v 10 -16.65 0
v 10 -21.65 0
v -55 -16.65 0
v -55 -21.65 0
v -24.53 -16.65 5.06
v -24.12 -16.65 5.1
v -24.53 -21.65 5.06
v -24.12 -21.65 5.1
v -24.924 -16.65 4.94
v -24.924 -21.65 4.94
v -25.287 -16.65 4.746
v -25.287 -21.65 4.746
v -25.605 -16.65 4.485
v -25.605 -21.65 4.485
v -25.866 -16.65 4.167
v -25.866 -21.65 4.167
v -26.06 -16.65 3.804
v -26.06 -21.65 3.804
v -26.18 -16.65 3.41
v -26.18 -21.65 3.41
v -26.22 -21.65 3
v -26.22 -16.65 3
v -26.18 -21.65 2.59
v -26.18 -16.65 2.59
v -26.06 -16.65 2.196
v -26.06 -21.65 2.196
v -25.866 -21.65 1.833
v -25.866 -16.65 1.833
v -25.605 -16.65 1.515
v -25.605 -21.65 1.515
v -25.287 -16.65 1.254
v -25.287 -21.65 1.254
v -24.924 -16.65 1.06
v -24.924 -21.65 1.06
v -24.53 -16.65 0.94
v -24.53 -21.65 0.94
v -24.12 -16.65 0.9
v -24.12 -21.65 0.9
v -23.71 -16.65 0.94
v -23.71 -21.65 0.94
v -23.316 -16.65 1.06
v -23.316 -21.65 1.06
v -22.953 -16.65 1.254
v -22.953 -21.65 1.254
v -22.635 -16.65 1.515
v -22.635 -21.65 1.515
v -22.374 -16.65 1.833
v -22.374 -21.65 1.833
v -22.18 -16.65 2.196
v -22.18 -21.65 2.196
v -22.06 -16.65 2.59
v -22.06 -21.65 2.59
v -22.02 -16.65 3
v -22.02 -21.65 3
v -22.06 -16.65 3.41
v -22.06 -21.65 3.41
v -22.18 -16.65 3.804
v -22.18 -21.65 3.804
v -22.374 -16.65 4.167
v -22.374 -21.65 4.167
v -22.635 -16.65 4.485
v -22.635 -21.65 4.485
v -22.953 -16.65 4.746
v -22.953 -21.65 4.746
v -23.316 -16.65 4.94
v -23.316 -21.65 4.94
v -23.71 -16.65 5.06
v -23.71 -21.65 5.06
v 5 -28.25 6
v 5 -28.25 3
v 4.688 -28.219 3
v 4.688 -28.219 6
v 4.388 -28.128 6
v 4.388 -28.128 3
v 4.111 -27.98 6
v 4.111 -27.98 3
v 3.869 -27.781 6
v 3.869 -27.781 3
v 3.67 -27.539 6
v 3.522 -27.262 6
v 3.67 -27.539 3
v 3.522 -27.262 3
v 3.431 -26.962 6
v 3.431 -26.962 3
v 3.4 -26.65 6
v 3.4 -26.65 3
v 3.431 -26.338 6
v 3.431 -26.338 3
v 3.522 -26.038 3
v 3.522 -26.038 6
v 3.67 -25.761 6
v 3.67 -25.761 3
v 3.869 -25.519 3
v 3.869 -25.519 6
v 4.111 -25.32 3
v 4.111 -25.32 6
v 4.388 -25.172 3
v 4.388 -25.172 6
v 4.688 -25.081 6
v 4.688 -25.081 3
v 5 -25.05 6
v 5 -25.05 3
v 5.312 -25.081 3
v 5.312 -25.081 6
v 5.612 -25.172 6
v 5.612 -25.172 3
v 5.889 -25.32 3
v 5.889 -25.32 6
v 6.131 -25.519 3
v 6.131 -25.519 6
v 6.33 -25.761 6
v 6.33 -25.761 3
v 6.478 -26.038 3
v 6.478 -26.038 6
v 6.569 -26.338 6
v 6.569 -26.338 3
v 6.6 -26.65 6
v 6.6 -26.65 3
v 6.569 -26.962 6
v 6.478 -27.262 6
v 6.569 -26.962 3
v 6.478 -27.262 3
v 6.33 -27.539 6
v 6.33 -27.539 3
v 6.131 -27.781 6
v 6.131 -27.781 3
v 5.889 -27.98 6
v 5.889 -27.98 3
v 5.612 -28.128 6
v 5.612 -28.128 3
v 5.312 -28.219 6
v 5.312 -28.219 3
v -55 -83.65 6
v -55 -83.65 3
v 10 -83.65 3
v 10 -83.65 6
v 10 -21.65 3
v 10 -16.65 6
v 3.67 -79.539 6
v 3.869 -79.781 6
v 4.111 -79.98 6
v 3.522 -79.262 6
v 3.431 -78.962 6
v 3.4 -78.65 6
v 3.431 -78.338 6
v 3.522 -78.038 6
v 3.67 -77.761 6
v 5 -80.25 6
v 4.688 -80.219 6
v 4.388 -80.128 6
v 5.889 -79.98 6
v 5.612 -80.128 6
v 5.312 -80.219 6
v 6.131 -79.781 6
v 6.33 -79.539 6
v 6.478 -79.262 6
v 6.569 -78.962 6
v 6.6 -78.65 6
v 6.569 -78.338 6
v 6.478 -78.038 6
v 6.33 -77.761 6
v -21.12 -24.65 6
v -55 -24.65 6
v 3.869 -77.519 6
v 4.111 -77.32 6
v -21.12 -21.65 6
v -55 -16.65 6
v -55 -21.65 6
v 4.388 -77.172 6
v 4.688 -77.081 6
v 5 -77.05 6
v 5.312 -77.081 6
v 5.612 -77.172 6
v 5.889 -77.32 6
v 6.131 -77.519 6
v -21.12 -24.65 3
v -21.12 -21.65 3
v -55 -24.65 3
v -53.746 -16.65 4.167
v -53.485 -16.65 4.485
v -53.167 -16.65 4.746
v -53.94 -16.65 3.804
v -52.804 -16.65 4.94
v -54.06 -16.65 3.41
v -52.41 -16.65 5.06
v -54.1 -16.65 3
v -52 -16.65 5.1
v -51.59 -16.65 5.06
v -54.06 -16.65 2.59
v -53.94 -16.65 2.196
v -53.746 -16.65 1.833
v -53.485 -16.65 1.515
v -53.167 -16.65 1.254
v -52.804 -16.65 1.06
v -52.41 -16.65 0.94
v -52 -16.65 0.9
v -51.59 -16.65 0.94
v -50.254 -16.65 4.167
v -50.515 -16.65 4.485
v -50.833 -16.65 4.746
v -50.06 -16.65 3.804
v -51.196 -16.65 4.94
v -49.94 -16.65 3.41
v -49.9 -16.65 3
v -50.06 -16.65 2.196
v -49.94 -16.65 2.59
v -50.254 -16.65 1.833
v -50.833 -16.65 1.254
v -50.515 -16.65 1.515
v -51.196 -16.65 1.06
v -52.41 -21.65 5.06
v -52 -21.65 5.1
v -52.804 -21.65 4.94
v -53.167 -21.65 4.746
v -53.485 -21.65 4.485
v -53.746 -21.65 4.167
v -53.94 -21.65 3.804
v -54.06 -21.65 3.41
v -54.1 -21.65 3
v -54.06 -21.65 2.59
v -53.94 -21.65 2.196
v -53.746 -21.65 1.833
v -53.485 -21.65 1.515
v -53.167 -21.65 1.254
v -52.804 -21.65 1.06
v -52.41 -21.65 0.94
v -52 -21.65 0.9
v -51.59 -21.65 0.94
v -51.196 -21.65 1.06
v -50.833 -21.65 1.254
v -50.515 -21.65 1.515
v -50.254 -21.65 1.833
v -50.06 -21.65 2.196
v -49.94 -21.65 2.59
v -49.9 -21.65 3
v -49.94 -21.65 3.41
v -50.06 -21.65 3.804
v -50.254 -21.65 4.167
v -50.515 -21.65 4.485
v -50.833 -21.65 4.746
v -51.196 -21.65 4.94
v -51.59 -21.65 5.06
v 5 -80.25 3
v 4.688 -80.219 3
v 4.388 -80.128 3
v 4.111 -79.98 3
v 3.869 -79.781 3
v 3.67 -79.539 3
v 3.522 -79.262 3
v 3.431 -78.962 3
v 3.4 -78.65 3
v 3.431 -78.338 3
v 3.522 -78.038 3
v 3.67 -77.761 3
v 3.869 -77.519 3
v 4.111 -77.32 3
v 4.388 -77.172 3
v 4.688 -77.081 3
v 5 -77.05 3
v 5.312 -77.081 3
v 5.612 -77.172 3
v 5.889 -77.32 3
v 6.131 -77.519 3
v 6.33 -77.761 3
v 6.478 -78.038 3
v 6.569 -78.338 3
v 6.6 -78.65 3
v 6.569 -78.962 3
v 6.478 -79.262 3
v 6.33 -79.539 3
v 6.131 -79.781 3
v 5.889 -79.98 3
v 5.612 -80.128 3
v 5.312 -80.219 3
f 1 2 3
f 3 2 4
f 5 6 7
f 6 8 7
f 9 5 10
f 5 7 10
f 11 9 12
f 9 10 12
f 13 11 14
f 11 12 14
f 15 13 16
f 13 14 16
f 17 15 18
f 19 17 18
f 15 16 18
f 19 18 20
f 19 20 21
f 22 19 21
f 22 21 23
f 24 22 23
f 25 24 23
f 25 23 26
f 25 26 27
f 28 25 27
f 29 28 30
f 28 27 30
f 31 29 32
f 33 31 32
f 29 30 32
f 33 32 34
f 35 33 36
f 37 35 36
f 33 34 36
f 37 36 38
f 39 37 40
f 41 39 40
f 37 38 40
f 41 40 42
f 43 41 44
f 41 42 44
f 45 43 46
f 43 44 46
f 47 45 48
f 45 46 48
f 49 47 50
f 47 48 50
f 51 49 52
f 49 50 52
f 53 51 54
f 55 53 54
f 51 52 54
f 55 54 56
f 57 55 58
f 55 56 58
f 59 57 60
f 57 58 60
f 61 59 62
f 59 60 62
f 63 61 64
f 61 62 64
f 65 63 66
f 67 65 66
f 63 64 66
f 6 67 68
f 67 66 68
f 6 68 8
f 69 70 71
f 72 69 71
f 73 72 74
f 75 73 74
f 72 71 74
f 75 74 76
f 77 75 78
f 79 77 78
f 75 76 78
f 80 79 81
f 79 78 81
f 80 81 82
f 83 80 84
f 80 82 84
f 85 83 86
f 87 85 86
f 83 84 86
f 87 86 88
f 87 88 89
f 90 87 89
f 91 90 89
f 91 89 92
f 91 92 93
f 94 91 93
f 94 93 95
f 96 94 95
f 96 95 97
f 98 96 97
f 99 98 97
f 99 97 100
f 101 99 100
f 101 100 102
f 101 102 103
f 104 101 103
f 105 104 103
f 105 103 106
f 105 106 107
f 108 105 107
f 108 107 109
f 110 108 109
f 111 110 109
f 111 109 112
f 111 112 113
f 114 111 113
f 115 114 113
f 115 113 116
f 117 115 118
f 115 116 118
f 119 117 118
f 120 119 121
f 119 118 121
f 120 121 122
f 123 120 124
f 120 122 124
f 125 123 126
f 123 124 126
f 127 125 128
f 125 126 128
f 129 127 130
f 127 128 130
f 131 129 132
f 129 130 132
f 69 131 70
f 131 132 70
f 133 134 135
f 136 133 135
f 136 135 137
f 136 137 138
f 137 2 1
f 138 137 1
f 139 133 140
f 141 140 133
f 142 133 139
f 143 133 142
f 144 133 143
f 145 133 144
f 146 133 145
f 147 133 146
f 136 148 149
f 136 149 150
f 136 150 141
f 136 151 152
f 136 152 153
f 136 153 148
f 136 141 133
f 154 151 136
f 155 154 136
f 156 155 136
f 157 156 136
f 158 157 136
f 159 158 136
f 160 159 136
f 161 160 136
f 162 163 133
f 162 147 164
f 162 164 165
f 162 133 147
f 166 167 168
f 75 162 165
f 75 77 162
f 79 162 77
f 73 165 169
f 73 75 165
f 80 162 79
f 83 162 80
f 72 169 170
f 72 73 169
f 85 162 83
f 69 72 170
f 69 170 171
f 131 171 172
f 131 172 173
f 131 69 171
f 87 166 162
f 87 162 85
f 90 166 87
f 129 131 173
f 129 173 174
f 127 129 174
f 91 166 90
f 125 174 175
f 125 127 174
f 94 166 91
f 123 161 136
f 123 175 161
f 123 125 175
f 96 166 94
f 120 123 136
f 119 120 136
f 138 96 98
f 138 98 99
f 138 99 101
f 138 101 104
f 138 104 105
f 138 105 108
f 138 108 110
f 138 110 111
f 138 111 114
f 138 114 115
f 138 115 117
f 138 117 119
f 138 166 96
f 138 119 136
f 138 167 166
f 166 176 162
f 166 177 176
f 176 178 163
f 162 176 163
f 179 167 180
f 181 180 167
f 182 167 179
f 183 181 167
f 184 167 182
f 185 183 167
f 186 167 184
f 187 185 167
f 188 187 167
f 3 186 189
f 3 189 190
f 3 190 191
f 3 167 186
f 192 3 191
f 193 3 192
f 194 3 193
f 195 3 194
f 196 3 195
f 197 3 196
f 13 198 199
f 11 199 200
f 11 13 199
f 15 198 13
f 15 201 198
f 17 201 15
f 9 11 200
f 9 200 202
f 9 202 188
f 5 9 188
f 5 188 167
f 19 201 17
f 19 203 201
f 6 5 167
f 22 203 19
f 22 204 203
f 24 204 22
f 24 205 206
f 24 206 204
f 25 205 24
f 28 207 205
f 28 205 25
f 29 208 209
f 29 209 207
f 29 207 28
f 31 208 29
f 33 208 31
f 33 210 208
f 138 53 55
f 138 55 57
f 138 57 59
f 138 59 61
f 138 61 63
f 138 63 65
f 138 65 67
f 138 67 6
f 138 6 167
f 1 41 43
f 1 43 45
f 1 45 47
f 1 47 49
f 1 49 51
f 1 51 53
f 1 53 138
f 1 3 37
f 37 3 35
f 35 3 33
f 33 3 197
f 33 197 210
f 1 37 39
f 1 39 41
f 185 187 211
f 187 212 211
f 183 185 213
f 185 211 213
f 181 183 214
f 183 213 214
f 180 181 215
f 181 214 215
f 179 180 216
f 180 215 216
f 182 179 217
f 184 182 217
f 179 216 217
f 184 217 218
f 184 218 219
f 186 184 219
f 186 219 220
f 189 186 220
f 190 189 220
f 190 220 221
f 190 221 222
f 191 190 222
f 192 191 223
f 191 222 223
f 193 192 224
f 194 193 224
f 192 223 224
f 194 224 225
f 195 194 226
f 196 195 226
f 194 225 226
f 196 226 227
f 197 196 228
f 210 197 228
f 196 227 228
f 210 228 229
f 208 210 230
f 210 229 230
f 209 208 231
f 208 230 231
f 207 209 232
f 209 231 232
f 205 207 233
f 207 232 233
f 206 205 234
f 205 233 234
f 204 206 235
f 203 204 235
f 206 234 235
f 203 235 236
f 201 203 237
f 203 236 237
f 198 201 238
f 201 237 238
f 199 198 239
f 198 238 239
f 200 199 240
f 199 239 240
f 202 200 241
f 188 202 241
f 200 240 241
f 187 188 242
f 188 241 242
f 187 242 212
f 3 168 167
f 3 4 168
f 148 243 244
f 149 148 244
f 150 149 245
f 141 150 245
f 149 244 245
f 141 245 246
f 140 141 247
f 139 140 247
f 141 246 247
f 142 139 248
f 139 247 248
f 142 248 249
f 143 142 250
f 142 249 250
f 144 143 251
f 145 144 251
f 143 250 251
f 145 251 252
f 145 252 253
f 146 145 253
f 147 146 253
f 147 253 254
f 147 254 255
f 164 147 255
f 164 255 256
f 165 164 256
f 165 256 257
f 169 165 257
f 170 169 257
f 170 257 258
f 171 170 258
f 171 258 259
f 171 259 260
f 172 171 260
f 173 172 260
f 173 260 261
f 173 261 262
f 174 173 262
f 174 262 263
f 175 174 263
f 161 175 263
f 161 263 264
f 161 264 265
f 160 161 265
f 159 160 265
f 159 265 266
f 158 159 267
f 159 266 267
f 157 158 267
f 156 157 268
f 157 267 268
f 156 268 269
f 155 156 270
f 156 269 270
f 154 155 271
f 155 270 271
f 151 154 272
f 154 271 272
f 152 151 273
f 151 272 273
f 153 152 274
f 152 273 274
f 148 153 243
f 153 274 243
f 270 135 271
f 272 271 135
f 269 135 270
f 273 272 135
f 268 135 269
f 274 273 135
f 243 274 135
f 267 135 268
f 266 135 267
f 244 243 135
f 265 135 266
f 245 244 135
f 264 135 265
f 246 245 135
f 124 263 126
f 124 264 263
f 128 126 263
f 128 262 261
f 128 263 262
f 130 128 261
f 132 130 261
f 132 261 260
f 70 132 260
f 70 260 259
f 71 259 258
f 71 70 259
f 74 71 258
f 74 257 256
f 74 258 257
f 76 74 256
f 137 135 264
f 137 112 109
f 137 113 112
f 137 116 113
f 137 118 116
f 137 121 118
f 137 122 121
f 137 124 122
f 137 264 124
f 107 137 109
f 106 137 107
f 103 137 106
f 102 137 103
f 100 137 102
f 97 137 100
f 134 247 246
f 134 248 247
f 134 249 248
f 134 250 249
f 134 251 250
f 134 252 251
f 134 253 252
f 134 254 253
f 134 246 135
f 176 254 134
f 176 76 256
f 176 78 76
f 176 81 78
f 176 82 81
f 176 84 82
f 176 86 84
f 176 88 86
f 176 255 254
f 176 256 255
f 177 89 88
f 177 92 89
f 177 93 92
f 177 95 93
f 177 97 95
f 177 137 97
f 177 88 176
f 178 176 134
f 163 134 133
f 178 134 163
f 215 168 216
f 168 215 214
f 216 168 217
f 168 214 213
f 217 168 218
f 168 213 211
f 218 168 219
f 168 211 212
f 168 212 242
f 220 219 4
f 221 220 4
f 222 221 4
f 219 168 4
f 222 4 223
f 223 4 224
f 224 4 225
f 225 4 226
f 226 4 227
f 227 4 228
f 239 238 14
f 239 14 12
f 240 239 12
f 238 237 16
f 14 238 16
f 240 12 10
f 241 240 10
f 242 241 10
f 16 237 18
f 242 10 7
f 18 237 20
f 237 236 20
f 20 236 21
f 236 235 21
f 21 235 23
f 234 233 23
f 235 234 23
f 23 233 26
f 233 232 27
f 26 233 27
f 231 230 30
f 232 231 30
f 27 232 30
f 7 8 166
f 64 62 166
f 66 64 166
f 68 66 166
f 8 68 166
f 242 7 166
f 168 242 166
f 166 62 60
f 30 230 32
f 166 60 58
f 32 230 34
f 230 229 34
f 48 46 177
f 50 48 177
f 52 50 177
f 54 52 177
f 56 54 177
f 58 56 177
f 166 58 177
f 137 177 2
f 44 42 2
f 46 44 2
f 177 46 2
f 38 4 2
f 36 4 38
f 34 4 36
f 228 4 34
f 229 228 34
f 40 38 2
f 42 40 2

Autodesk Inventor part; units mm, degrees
ref_plane "YZ Plane" through (0, 0, 0) normal (1, 0, 0) x (0, 1, 0)
ref_plane "XZ Plane" through (0, 0, 0) normal (0, 1, 0) x (-1, 0, 0)
ref_plane "XY Plane" through (0, 0, 0) normal (0, 0, 1) x (1, 0, 0)
sketch "Boceto1" plane through (0, 0, 0) normal (0, 0, 1) x (1, 0, 0)
  line L0 (30, -83.65) -> (30, 0) projected
  line L1 (0, 0) -> (30, 0) projected
  line L2 (0, 0) -> (0, -83.65) projected
  line L3 (0, -83.65) -> (30, -83.65) projected
  line L4 (-13.92, -24.65) -> (-9.92, -24.65) projected
  line L5 (30, -83.65) -> (-55, -83.65)
  line L6 (-55, -83.65) -> (-55, -24.65)
  line L7 (-55, -24.65) -> (30, -24.65)
  line L8 (30, -24.65) -> (30, -83.65)
  line L9 (-55, -24.65) -> (-55, -21.65)
  line L10 (-55, -21.65) -> (30, -21.65)
  line L11 (0, -83.65) -> (10, -83.65)
  line L12 (10, -83.65) -> (10, -21.65)
  circle A0 centre (5, -78.65) radius 2.1 projected
  circle A1 centre (5, -26.65) radius 2.1 projected
  dimension "d0" = 85
  dimension "d1" = 59
  dimension "d2" = 3
  dimension "d5" = 10
extrude "Extrusión1" add sketch "Boceto1" along normal blind 6 contours L3 L2 L7 A1 L12 | L7 A1 L2 L10 L12 | L5 L6 L7 L4 L2 | A1 L7 | L7 A1 | L7 L4 L9 L10 L2 | A0
sketch "Boceto2" plane through (0, 0, 6) normal (0, 0, 1) x (1, 0, 0)
  line L0 (10, -83.65) -> (10, -21.65) projected
  line L1 (-55, -83.65) -> (10, -83.65) projected
  line L2 (10, -21.65) -> (-55, -21.65) projected
  point P0 (0, 0)
  point P1 (5, -78.65)
  point P2 (5, -26.65)
  dimension "d6" = 5
  dimension "d7" = 5
  dimension "d8" = 5
  dimension "d9" = 5
hole "Agujero1" at (5, -78.65, 6) at (5, -26.65, 6) direction (0, 0, -1) diameter 3.2 end through all
sketch "Boceto3" plane through (0, 0, 0) normal (0, 0, -1) x (-1, 0, 0)
  circle A0 centre (-5, -78.65) radius 2.1
  circle A1 centre (-5, -26.65) radius 2.1
  line L0 (-12, 0) -> (-12, -7.15)
  line L1 (-12, -7.15) -> (-30, -7.15)
  line L2 (-30, -7.15) -> (-30, -83.65)
  line L3 (0, -83.65) -> (-30, -83.65)
  line L4 (0, -83.65) -> (0, 0)
  line L5 (0, 0) -> (-12, 0)
  line L6 (20.12, -21.65) -> (-10, -21.65)
  line L7 (-10, -21.65) -> (-10, -83.65)
  circle A2 centre (-5, -26.65) radius 1.6
  circle A3 centre (-5, -78.65) radius 1.6
  circle A4 centre (-5, -26.65) radius 1.6 projected
  circle A5 centre (-5, -78.65) radius 1.6 projected
  line L8 (55, -21.65) -> (55, -83.65) projected
  line L9 (-10, -21.65) -> (55, -21.65) projected
  line L10 (-10, -83.65) -> (-10, -21.65) projected
  line L11 (55, -83.65) -> (-10, -83.65) projected
  line L12 (-10, -83.65) -> (20.12, -83.65)
  line L13 (20.12, -83.65) -> (20.12, -21.65)
  point P0 (0, -21.65)
extrude "Extrusión2" cut sketch "Boceto3" against normal blind 3 contours A0 | A1 | L5 L4 L6 L7 L3 L2 L1 L0 | L6 L13 L11 L4 | L4 L3 L7 L6 | L9 L8 L11 L13 | A2 | A3
sketch "Boceto4" plane through (-55, -21.65, 6) normal (0, 1, 0) x (1, 0, 0)
  line L0 (65, 3) -> (0, 3) projected
  line L1 (0, 3) -> (0, 0) projected
  line L2 (65, 0) -> (0, 0) projected
  line L3 (65, 3) -> (65, 0) projected
  line L4 (0, 0) -> (65, 0)
  line L5 (65, 0) -> (65, 6)
  line L6 (65, 6) -> (0, 6)
  line L7 (0, 6) -> (0, 0)
  point P0 (55, 6)
extrude "Extrusión3" add sketch "Boceto4" along normal blind 5
sketch "Boceto5" plane through (-55, -83.65, 3) normal (-1, 0, 0) x (0, 0, 1)
  line L0 (-69, 62) -> (-69, 59)
  line L1 (-3, 59) -> (-69, 59)
  line L2 (-3, 59) -> (-3, 62)
  line L3 (-3, 62) -> (-69, 62)
  line L4 (0, 62) -> (0, 0) projected
  line L5 (0, 0) -> (3, 0) projected
  line L6 (3, 0) -> (3, 67) projected
  line L7 (-3, 67) -> (3, 67) projected
  line L8 (-3, 62) -> (-3, 67) projected
  line L9 (-3, 62) -> (0, 62) projected
  line L10 (-3, 59) -> (3, 59)
  line L11 (3, 59) -> (3, 62)
  line L12 (3, 62) -> (-3, 62)
  line L13 (-3, 62) -> (-3, 59)
  point P0 (-3, 83.65)
  point P1 (0, 59)
extrude "Extrusión4" cut sketch "Boceto5" against normal blind 33.88 contours L12 L6 L10 L4
sketch "Boceto6" plane through (-55, -16.65, 6) normal (0, 1, 0) x (1, 0, 0)
  line L0 (0, 6) -> (0, 0) projected
  line L1 (0, 0) -> (65, 0) projected
  line L2 (65, 0) -> (65, 6) projected
  line L3 (65, 6) -> (0, 6) projected
  line L4 (0, 0) -> (0, 3)
  line L5 (0, 3) -> (3, 3)
  circle A0 centre (3, 3) radius 2.1
  line L6 (33.88, 3) -> (33.88, 0) projected
  line L7 (33.88, 3) -> (30.88, 3)
  circle A1 centre (30.88, 3) radius 2.1
  dimension "d34" = 3
  dimension "d35" = 4.2
  dimension "d36" = 4.2
hole "Agujero2" at (-52, -16.65, 3) at (-24.12, -16.65, 3) direction (0, -1, 0) diameter 4.2 depth 5
properties part number "Lateral izquierdo"
